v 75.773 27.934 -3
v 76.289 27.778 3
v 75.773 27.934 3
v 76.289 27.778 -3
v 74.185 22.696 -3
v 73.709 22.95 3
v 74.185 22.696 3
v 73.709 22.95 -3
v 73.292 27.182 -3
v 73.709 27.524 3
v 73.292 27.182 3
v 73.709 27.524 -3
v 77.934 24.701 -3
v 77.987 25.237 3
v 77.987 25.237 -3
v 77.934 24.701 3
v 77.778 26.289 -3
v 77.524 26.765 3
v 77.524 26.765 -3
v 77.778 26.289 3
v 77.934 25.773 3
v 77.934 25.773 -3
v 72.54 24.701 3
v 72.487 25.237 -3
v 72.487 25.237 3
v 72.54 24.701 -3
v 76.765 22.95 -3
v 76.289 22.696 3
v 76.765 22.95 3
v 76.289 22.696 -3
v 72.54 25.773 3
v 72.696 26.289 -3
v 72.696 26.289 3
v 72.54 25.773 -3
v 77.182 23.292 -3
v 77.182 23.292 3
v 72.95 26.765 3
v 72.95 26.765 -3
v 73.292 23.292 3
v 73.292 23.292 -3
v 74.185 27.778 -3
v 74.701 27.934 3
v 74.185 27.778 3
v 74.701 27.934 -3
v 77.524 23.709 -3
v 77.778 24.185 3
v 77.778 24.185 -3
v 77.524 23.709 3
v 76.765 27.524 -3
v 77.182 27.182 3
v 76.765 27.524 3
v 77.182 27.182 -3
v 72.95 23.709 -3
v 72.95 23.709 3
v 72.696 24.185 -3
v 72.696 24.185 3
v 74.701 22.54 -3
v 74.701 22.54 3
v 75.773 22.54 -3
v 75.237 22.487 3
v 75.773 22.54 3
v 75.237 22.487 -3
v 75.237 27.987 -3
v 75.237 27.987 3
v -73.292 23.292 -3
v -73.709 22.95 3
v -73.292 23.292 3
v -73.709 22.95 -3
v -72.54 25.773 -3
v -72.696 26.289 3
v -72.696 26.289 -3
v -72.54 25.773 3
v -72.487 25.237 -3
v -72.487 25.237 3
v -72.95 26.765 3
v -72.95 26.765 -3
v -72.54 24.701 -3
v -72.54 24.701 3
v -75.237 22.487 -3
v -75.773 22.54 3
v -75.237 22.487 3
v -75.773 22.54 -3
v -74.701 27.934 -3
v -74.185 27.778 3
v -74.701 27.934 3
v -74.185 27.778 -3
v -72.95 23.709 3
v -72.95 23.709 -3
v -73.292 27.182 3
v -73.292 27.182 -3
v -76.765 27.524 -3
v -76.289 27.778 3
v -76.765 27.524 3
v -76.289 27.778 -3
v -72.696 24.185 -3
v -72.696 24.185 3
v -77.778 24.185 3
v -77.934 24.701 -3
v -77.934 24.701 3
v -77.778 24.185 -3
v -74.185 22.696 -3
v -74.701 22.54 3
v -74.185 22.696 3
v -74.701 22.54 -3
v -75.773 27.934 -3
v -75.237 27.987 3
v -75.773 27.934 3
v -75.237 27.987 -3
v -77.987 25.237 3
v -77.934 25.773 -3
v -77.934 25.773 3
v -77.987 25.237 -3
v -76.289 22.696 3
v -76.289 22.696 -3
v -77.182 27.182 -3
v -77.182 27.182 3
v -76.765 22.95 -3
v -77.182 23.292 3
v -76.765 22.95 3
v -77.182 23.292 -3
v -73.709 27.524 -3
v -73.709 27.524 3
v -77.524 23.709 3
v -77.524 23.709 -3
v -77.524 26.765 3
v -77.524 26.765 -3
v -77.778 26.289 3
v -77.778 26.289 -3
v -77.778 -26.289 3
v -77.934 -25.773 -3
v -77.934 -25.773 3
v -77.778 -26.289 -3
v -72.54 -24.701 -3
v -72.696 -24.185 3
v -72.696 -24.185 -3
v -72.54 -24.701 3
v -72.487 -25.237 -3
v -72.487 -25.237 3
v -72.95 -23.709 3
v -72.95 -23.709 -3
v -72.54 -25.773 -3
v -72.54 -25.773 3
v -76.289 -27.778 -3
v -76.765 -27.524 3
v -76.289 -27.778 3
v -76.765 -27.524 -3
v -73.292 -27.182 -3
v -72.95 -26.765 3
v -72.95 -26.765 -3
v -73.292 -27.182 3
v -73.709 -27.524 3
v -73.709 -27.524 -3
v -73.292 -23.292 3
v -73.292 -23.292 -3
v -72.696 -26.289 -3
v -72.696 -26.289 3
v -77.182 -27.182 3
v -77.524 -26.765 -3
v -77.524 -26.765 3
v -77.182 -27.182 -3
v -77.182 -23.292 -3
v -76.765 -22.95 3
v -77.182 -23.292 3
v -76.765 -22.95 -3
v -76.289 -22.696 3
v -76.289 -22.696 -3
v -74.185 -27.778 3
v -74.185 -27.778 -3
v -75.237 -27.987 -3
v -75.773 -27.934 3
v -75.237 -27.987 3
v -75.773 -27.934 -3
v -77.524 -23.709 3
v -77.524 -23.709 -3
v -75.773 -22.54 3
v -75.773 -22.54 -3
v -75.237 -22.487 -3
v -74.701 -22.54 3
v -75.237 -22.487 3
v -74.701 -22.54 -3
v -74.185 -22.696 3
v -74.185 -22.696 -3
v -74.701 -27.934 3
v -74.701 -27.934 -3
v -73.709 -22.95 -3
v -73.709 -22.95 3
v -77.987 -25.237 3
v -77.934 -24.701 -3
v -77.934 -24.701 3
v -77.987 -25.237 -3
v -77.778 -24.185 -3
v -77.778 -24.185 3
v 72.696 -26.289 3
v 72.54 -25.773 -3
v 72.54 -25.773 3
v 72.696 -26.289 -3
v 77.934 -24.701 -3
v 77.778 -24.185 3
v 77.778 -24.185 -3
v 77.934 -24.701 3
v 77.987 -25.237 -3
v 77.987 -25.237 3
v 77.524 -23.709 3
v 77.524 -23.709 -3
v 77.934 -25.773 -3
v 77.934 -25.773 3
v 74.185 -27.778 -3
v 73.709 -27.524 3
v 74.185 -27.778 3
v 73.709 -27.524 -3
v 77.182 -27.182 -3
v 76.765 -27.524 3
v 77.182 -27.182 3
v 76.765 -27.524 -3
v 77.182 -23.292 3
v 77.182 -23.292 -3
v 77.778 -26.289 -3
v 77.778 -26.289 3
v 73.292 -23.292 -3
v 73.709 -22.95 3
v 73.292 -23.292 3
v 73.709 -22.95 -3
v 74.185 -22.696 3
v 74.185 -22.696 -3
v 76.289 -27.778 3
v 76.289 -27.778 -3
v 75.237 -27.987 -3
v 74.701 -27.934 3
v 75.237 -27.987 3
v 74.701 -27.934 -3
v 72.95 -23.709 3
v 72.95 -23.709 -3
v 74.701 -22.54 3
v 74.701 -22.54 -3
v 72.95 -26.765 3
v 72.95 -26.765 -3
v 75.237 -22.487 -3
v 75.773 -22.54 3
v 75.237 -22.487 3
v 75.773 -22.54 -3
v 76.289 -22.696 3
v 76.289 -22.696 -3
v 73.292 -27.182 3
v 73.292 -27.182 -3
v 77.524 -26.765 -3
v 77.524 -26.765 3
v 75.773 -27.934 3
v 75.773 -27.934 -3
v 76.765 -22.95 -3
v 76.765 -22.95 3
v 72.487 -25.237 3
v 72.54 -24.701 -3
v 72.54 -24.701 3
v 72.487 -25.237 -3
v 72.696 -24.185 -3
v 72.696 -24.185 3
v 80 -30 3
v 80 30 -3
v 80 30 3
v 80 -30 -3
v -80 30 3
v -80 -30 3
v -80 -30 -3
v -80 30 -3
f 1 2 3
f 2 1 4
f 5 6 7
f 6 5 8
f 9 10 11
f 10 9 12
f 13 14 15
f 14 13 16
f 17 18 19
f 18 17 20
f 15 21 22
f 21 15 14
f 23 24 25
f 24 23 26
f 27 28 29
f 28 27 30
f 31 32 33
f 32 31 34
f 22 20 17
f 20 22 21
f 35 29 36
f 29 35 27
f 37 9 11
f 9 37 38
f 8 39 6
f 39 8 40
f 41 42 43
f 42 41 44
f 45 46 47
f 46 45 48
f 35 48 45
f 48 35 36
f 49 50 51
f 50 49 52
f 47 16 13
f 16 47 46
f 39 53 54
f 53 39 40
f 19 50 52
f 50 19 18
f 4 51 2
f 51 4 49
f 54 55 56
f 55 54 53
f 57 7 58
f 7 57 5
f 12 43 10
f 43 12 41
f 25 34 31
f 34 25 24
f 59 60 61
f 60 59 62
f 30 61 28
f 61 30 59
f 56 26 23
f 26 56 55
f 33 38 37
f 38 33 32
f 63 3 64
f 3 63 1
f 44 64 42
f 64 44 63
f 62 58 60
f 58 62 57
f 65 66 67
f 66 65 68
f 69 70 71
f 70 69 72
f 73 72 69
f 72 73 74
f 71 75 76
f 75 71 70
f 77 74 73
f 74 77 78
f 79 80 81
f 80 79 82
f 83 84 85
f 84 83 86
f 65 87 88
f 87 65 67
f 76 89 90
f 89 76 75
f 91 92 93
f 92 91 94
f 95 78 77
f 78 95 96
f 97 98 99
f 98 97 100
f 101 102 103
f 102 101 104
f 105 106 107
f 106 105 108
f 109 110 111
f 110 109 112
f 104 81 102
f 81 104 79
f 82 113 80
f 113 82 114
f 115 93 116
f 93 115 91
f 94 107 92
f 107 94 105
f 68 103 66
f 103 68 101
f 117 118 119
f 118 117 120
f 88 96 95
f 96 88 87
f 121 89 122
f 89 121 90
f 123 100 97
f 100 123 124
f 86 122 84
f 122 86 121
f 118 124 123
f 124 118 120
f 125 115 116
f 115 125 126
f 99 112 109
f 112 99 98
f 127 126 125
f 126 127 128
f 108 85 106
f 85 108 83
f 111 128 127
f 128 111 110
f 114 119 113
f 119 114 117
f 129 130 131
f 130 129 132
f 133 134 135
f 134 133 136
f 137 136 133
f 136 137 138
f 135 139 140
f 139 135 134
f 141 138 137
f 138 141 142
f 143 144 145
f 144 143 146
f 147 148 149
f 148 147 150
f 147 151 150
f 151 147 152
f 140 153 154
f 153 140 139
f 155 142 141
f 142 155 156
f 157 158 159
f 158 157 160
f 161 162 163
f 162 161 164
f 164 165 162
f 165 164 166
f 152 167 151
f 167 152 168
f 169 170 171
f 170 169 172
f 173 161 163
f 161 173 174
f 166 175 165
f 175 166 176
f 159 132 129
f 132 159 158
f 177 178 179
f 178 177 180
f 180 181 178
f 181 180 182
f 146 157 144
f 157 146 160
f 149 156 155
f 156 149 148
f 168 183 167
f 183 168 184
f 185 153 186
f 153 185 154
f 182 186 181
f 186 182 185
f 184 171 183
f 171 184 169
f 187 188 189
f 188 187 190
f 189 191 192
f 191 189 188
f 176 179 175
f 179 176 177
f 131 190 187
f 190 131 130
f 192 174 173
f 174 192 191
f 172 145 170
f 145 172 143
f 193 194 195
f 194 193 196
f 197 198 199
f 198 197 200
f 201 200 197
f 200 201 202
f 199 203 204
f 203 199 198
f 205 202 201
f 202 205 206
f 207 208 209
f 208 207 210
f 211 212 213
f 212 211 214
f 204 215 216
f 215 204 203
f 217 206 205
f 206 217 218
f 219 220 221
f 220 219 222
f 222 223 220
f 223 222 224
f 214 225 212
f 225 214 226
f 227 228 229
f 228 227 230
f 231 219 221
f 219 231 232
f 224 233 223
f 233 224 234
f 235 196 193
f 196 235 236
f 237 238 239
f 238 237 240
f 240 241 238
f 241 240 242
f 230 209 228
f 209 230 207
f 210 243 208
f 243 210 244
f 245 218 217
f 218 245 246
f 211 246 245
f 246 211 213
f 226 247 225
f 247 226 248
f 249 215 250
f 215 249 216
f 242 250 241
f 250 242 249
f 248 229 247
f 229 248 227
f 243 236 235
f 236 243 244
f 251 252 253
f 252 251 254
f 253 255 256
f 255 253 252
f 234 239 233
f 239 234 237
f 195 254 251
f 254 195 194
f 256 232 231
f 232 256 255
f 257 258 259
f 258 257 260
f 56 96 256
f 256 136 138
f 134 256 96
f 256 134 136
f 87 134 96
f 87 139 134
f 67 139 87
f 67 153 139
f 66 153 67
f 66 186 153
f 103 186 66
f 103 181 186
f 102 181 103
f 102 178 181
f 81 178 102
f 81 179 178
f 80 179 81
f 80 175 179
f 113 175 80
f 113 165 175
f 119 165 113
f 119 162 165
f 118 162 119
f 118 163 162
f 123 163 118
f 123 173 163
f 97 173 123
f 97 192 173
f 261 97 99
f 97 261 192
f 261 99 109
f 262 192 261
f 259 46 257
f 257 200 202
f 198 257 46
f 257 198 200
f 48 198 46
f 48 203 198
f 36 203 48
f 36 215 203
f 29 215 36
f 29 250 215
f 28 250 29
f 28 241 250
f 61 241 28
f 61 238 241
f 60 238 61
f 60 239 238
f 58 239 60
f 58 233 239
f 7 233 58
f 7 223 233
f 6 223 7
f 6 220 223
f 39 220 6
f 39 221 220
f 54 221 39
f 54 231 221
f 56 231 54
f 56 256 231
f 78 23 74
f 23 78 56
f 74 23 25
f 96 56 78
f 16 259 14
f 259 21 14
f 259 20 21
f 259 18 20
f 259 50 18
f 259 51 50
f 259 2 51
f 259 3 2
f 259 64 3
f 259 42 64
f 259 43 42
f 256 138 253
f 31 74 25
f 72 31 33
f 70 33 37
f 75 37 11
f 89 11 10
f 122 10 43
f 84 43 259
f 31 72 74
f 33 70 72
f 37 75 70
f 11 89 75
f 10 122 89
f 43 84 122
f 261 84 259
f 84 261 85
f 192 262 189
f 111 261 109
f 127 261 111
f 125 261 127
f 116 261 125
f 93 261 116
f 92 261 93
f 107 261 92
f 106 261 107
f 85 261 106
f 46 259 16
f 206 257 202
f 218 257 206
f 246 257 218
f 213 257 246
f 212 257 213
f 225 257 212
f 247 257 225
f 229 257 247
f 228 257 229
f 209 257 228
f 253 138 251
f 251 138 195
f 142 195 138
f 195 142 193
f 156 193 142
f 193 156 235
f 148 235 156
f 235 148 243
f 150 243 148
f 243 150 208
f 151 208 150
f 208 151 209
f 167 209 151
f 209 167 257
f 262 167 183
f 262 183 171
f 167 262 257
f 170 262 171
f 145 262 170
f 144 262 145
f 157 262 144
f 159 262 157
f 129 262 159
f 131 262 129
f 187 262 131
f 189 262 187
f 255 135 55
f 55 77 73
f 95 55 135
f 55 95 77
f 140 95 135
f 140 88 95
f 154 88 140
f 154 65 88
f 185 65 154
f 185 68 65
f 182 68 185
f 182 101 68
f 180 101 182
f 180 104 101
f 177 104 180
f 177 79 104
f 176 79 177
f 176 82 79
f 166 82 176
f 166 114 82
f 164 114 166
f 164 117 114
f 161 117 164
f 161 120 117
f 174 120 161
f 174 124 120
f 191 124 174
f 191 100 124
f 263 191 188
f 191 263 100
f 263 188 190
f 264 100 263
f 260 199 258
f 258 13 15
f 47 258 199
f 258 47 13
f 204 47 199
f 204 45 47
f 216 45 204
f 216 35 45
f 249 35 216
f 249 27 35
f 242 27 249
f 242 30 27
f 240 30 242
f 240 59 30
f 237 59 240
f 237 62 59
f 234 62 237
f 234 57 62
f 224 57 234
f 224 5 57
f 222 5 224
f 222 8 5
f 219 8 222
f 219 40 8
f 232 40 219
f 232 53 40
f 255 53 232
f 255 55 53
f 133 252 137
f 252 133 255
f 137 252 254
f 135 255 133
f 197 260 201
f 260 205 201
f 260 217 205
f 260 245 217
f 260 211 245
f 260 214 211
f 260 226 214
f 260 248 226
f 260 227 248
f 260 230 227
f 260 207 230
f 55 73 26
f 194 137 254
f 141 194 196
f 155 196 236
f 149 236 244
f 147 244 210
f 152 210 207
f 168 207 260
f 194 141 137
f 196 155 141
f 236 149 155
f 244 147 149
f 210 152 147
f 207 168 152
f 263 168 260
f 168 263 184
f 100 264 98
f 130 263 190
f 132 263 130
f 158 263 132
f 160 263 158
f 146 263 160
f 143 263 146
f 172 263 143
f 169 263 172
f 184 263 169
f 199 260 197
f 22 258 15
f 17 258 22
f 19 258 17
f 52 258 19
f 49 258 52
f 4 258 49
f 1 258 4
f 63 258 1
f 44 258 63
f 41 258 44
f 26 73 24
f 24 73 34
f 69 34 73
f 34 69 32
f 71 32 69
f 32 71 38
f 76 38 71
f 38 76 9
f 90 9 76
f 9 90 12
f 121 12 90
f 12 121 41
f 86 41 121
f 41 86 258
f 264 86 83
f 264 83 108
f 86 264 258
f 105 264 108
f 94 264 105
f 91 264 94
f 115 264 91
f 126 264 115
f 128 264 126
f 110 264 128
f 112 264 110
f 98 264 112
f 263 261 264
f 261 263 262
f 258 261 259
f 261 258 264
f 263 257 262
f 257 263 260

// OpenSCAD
$fn = 32;

// ----------------------------------------------------------------------
// Corner plate 160 x 60 x 6
// 4 holes, centres taken from the edge offset
// ----------------------------------------------------------------------

// --- parameters (mm) ---
plate = [160, 60, 6];  // overall size (x, y, z)
seat_tol = 0.1;        // tolerance at the seating features
free_tol = 0.3;        // general tolerance on the free sizes
holes = 4;             // number of holes the drawing asks for
hole_d = 5.5;          // hole diameter
edge = 4.763;          // hole centre offset from the plate edge

// --- derived feature positions (mm) ---
corner_x = plate[0] / 2 - edge;  // = 75.24   corner hole X
corner_y = plate[1] / 2 - edge;  // = 25.24   corner hole Y
feature_centers = [
  [corner_x, corner_y],
  [-corner_x, corner_y],
  [-corner_x, -corner_y],
  [corner_x, -corner_y]
];   // hole centres the loop below drills

// plate outline, every hole drilled through with the same cutters
difference() {
  cube(plate, center = true);
  for (centre = feature_centers)
    translate([centre[0], centre[1], 0])
      cylinder(d = hole_d, h = plate[2] + 2, center = true);
}
